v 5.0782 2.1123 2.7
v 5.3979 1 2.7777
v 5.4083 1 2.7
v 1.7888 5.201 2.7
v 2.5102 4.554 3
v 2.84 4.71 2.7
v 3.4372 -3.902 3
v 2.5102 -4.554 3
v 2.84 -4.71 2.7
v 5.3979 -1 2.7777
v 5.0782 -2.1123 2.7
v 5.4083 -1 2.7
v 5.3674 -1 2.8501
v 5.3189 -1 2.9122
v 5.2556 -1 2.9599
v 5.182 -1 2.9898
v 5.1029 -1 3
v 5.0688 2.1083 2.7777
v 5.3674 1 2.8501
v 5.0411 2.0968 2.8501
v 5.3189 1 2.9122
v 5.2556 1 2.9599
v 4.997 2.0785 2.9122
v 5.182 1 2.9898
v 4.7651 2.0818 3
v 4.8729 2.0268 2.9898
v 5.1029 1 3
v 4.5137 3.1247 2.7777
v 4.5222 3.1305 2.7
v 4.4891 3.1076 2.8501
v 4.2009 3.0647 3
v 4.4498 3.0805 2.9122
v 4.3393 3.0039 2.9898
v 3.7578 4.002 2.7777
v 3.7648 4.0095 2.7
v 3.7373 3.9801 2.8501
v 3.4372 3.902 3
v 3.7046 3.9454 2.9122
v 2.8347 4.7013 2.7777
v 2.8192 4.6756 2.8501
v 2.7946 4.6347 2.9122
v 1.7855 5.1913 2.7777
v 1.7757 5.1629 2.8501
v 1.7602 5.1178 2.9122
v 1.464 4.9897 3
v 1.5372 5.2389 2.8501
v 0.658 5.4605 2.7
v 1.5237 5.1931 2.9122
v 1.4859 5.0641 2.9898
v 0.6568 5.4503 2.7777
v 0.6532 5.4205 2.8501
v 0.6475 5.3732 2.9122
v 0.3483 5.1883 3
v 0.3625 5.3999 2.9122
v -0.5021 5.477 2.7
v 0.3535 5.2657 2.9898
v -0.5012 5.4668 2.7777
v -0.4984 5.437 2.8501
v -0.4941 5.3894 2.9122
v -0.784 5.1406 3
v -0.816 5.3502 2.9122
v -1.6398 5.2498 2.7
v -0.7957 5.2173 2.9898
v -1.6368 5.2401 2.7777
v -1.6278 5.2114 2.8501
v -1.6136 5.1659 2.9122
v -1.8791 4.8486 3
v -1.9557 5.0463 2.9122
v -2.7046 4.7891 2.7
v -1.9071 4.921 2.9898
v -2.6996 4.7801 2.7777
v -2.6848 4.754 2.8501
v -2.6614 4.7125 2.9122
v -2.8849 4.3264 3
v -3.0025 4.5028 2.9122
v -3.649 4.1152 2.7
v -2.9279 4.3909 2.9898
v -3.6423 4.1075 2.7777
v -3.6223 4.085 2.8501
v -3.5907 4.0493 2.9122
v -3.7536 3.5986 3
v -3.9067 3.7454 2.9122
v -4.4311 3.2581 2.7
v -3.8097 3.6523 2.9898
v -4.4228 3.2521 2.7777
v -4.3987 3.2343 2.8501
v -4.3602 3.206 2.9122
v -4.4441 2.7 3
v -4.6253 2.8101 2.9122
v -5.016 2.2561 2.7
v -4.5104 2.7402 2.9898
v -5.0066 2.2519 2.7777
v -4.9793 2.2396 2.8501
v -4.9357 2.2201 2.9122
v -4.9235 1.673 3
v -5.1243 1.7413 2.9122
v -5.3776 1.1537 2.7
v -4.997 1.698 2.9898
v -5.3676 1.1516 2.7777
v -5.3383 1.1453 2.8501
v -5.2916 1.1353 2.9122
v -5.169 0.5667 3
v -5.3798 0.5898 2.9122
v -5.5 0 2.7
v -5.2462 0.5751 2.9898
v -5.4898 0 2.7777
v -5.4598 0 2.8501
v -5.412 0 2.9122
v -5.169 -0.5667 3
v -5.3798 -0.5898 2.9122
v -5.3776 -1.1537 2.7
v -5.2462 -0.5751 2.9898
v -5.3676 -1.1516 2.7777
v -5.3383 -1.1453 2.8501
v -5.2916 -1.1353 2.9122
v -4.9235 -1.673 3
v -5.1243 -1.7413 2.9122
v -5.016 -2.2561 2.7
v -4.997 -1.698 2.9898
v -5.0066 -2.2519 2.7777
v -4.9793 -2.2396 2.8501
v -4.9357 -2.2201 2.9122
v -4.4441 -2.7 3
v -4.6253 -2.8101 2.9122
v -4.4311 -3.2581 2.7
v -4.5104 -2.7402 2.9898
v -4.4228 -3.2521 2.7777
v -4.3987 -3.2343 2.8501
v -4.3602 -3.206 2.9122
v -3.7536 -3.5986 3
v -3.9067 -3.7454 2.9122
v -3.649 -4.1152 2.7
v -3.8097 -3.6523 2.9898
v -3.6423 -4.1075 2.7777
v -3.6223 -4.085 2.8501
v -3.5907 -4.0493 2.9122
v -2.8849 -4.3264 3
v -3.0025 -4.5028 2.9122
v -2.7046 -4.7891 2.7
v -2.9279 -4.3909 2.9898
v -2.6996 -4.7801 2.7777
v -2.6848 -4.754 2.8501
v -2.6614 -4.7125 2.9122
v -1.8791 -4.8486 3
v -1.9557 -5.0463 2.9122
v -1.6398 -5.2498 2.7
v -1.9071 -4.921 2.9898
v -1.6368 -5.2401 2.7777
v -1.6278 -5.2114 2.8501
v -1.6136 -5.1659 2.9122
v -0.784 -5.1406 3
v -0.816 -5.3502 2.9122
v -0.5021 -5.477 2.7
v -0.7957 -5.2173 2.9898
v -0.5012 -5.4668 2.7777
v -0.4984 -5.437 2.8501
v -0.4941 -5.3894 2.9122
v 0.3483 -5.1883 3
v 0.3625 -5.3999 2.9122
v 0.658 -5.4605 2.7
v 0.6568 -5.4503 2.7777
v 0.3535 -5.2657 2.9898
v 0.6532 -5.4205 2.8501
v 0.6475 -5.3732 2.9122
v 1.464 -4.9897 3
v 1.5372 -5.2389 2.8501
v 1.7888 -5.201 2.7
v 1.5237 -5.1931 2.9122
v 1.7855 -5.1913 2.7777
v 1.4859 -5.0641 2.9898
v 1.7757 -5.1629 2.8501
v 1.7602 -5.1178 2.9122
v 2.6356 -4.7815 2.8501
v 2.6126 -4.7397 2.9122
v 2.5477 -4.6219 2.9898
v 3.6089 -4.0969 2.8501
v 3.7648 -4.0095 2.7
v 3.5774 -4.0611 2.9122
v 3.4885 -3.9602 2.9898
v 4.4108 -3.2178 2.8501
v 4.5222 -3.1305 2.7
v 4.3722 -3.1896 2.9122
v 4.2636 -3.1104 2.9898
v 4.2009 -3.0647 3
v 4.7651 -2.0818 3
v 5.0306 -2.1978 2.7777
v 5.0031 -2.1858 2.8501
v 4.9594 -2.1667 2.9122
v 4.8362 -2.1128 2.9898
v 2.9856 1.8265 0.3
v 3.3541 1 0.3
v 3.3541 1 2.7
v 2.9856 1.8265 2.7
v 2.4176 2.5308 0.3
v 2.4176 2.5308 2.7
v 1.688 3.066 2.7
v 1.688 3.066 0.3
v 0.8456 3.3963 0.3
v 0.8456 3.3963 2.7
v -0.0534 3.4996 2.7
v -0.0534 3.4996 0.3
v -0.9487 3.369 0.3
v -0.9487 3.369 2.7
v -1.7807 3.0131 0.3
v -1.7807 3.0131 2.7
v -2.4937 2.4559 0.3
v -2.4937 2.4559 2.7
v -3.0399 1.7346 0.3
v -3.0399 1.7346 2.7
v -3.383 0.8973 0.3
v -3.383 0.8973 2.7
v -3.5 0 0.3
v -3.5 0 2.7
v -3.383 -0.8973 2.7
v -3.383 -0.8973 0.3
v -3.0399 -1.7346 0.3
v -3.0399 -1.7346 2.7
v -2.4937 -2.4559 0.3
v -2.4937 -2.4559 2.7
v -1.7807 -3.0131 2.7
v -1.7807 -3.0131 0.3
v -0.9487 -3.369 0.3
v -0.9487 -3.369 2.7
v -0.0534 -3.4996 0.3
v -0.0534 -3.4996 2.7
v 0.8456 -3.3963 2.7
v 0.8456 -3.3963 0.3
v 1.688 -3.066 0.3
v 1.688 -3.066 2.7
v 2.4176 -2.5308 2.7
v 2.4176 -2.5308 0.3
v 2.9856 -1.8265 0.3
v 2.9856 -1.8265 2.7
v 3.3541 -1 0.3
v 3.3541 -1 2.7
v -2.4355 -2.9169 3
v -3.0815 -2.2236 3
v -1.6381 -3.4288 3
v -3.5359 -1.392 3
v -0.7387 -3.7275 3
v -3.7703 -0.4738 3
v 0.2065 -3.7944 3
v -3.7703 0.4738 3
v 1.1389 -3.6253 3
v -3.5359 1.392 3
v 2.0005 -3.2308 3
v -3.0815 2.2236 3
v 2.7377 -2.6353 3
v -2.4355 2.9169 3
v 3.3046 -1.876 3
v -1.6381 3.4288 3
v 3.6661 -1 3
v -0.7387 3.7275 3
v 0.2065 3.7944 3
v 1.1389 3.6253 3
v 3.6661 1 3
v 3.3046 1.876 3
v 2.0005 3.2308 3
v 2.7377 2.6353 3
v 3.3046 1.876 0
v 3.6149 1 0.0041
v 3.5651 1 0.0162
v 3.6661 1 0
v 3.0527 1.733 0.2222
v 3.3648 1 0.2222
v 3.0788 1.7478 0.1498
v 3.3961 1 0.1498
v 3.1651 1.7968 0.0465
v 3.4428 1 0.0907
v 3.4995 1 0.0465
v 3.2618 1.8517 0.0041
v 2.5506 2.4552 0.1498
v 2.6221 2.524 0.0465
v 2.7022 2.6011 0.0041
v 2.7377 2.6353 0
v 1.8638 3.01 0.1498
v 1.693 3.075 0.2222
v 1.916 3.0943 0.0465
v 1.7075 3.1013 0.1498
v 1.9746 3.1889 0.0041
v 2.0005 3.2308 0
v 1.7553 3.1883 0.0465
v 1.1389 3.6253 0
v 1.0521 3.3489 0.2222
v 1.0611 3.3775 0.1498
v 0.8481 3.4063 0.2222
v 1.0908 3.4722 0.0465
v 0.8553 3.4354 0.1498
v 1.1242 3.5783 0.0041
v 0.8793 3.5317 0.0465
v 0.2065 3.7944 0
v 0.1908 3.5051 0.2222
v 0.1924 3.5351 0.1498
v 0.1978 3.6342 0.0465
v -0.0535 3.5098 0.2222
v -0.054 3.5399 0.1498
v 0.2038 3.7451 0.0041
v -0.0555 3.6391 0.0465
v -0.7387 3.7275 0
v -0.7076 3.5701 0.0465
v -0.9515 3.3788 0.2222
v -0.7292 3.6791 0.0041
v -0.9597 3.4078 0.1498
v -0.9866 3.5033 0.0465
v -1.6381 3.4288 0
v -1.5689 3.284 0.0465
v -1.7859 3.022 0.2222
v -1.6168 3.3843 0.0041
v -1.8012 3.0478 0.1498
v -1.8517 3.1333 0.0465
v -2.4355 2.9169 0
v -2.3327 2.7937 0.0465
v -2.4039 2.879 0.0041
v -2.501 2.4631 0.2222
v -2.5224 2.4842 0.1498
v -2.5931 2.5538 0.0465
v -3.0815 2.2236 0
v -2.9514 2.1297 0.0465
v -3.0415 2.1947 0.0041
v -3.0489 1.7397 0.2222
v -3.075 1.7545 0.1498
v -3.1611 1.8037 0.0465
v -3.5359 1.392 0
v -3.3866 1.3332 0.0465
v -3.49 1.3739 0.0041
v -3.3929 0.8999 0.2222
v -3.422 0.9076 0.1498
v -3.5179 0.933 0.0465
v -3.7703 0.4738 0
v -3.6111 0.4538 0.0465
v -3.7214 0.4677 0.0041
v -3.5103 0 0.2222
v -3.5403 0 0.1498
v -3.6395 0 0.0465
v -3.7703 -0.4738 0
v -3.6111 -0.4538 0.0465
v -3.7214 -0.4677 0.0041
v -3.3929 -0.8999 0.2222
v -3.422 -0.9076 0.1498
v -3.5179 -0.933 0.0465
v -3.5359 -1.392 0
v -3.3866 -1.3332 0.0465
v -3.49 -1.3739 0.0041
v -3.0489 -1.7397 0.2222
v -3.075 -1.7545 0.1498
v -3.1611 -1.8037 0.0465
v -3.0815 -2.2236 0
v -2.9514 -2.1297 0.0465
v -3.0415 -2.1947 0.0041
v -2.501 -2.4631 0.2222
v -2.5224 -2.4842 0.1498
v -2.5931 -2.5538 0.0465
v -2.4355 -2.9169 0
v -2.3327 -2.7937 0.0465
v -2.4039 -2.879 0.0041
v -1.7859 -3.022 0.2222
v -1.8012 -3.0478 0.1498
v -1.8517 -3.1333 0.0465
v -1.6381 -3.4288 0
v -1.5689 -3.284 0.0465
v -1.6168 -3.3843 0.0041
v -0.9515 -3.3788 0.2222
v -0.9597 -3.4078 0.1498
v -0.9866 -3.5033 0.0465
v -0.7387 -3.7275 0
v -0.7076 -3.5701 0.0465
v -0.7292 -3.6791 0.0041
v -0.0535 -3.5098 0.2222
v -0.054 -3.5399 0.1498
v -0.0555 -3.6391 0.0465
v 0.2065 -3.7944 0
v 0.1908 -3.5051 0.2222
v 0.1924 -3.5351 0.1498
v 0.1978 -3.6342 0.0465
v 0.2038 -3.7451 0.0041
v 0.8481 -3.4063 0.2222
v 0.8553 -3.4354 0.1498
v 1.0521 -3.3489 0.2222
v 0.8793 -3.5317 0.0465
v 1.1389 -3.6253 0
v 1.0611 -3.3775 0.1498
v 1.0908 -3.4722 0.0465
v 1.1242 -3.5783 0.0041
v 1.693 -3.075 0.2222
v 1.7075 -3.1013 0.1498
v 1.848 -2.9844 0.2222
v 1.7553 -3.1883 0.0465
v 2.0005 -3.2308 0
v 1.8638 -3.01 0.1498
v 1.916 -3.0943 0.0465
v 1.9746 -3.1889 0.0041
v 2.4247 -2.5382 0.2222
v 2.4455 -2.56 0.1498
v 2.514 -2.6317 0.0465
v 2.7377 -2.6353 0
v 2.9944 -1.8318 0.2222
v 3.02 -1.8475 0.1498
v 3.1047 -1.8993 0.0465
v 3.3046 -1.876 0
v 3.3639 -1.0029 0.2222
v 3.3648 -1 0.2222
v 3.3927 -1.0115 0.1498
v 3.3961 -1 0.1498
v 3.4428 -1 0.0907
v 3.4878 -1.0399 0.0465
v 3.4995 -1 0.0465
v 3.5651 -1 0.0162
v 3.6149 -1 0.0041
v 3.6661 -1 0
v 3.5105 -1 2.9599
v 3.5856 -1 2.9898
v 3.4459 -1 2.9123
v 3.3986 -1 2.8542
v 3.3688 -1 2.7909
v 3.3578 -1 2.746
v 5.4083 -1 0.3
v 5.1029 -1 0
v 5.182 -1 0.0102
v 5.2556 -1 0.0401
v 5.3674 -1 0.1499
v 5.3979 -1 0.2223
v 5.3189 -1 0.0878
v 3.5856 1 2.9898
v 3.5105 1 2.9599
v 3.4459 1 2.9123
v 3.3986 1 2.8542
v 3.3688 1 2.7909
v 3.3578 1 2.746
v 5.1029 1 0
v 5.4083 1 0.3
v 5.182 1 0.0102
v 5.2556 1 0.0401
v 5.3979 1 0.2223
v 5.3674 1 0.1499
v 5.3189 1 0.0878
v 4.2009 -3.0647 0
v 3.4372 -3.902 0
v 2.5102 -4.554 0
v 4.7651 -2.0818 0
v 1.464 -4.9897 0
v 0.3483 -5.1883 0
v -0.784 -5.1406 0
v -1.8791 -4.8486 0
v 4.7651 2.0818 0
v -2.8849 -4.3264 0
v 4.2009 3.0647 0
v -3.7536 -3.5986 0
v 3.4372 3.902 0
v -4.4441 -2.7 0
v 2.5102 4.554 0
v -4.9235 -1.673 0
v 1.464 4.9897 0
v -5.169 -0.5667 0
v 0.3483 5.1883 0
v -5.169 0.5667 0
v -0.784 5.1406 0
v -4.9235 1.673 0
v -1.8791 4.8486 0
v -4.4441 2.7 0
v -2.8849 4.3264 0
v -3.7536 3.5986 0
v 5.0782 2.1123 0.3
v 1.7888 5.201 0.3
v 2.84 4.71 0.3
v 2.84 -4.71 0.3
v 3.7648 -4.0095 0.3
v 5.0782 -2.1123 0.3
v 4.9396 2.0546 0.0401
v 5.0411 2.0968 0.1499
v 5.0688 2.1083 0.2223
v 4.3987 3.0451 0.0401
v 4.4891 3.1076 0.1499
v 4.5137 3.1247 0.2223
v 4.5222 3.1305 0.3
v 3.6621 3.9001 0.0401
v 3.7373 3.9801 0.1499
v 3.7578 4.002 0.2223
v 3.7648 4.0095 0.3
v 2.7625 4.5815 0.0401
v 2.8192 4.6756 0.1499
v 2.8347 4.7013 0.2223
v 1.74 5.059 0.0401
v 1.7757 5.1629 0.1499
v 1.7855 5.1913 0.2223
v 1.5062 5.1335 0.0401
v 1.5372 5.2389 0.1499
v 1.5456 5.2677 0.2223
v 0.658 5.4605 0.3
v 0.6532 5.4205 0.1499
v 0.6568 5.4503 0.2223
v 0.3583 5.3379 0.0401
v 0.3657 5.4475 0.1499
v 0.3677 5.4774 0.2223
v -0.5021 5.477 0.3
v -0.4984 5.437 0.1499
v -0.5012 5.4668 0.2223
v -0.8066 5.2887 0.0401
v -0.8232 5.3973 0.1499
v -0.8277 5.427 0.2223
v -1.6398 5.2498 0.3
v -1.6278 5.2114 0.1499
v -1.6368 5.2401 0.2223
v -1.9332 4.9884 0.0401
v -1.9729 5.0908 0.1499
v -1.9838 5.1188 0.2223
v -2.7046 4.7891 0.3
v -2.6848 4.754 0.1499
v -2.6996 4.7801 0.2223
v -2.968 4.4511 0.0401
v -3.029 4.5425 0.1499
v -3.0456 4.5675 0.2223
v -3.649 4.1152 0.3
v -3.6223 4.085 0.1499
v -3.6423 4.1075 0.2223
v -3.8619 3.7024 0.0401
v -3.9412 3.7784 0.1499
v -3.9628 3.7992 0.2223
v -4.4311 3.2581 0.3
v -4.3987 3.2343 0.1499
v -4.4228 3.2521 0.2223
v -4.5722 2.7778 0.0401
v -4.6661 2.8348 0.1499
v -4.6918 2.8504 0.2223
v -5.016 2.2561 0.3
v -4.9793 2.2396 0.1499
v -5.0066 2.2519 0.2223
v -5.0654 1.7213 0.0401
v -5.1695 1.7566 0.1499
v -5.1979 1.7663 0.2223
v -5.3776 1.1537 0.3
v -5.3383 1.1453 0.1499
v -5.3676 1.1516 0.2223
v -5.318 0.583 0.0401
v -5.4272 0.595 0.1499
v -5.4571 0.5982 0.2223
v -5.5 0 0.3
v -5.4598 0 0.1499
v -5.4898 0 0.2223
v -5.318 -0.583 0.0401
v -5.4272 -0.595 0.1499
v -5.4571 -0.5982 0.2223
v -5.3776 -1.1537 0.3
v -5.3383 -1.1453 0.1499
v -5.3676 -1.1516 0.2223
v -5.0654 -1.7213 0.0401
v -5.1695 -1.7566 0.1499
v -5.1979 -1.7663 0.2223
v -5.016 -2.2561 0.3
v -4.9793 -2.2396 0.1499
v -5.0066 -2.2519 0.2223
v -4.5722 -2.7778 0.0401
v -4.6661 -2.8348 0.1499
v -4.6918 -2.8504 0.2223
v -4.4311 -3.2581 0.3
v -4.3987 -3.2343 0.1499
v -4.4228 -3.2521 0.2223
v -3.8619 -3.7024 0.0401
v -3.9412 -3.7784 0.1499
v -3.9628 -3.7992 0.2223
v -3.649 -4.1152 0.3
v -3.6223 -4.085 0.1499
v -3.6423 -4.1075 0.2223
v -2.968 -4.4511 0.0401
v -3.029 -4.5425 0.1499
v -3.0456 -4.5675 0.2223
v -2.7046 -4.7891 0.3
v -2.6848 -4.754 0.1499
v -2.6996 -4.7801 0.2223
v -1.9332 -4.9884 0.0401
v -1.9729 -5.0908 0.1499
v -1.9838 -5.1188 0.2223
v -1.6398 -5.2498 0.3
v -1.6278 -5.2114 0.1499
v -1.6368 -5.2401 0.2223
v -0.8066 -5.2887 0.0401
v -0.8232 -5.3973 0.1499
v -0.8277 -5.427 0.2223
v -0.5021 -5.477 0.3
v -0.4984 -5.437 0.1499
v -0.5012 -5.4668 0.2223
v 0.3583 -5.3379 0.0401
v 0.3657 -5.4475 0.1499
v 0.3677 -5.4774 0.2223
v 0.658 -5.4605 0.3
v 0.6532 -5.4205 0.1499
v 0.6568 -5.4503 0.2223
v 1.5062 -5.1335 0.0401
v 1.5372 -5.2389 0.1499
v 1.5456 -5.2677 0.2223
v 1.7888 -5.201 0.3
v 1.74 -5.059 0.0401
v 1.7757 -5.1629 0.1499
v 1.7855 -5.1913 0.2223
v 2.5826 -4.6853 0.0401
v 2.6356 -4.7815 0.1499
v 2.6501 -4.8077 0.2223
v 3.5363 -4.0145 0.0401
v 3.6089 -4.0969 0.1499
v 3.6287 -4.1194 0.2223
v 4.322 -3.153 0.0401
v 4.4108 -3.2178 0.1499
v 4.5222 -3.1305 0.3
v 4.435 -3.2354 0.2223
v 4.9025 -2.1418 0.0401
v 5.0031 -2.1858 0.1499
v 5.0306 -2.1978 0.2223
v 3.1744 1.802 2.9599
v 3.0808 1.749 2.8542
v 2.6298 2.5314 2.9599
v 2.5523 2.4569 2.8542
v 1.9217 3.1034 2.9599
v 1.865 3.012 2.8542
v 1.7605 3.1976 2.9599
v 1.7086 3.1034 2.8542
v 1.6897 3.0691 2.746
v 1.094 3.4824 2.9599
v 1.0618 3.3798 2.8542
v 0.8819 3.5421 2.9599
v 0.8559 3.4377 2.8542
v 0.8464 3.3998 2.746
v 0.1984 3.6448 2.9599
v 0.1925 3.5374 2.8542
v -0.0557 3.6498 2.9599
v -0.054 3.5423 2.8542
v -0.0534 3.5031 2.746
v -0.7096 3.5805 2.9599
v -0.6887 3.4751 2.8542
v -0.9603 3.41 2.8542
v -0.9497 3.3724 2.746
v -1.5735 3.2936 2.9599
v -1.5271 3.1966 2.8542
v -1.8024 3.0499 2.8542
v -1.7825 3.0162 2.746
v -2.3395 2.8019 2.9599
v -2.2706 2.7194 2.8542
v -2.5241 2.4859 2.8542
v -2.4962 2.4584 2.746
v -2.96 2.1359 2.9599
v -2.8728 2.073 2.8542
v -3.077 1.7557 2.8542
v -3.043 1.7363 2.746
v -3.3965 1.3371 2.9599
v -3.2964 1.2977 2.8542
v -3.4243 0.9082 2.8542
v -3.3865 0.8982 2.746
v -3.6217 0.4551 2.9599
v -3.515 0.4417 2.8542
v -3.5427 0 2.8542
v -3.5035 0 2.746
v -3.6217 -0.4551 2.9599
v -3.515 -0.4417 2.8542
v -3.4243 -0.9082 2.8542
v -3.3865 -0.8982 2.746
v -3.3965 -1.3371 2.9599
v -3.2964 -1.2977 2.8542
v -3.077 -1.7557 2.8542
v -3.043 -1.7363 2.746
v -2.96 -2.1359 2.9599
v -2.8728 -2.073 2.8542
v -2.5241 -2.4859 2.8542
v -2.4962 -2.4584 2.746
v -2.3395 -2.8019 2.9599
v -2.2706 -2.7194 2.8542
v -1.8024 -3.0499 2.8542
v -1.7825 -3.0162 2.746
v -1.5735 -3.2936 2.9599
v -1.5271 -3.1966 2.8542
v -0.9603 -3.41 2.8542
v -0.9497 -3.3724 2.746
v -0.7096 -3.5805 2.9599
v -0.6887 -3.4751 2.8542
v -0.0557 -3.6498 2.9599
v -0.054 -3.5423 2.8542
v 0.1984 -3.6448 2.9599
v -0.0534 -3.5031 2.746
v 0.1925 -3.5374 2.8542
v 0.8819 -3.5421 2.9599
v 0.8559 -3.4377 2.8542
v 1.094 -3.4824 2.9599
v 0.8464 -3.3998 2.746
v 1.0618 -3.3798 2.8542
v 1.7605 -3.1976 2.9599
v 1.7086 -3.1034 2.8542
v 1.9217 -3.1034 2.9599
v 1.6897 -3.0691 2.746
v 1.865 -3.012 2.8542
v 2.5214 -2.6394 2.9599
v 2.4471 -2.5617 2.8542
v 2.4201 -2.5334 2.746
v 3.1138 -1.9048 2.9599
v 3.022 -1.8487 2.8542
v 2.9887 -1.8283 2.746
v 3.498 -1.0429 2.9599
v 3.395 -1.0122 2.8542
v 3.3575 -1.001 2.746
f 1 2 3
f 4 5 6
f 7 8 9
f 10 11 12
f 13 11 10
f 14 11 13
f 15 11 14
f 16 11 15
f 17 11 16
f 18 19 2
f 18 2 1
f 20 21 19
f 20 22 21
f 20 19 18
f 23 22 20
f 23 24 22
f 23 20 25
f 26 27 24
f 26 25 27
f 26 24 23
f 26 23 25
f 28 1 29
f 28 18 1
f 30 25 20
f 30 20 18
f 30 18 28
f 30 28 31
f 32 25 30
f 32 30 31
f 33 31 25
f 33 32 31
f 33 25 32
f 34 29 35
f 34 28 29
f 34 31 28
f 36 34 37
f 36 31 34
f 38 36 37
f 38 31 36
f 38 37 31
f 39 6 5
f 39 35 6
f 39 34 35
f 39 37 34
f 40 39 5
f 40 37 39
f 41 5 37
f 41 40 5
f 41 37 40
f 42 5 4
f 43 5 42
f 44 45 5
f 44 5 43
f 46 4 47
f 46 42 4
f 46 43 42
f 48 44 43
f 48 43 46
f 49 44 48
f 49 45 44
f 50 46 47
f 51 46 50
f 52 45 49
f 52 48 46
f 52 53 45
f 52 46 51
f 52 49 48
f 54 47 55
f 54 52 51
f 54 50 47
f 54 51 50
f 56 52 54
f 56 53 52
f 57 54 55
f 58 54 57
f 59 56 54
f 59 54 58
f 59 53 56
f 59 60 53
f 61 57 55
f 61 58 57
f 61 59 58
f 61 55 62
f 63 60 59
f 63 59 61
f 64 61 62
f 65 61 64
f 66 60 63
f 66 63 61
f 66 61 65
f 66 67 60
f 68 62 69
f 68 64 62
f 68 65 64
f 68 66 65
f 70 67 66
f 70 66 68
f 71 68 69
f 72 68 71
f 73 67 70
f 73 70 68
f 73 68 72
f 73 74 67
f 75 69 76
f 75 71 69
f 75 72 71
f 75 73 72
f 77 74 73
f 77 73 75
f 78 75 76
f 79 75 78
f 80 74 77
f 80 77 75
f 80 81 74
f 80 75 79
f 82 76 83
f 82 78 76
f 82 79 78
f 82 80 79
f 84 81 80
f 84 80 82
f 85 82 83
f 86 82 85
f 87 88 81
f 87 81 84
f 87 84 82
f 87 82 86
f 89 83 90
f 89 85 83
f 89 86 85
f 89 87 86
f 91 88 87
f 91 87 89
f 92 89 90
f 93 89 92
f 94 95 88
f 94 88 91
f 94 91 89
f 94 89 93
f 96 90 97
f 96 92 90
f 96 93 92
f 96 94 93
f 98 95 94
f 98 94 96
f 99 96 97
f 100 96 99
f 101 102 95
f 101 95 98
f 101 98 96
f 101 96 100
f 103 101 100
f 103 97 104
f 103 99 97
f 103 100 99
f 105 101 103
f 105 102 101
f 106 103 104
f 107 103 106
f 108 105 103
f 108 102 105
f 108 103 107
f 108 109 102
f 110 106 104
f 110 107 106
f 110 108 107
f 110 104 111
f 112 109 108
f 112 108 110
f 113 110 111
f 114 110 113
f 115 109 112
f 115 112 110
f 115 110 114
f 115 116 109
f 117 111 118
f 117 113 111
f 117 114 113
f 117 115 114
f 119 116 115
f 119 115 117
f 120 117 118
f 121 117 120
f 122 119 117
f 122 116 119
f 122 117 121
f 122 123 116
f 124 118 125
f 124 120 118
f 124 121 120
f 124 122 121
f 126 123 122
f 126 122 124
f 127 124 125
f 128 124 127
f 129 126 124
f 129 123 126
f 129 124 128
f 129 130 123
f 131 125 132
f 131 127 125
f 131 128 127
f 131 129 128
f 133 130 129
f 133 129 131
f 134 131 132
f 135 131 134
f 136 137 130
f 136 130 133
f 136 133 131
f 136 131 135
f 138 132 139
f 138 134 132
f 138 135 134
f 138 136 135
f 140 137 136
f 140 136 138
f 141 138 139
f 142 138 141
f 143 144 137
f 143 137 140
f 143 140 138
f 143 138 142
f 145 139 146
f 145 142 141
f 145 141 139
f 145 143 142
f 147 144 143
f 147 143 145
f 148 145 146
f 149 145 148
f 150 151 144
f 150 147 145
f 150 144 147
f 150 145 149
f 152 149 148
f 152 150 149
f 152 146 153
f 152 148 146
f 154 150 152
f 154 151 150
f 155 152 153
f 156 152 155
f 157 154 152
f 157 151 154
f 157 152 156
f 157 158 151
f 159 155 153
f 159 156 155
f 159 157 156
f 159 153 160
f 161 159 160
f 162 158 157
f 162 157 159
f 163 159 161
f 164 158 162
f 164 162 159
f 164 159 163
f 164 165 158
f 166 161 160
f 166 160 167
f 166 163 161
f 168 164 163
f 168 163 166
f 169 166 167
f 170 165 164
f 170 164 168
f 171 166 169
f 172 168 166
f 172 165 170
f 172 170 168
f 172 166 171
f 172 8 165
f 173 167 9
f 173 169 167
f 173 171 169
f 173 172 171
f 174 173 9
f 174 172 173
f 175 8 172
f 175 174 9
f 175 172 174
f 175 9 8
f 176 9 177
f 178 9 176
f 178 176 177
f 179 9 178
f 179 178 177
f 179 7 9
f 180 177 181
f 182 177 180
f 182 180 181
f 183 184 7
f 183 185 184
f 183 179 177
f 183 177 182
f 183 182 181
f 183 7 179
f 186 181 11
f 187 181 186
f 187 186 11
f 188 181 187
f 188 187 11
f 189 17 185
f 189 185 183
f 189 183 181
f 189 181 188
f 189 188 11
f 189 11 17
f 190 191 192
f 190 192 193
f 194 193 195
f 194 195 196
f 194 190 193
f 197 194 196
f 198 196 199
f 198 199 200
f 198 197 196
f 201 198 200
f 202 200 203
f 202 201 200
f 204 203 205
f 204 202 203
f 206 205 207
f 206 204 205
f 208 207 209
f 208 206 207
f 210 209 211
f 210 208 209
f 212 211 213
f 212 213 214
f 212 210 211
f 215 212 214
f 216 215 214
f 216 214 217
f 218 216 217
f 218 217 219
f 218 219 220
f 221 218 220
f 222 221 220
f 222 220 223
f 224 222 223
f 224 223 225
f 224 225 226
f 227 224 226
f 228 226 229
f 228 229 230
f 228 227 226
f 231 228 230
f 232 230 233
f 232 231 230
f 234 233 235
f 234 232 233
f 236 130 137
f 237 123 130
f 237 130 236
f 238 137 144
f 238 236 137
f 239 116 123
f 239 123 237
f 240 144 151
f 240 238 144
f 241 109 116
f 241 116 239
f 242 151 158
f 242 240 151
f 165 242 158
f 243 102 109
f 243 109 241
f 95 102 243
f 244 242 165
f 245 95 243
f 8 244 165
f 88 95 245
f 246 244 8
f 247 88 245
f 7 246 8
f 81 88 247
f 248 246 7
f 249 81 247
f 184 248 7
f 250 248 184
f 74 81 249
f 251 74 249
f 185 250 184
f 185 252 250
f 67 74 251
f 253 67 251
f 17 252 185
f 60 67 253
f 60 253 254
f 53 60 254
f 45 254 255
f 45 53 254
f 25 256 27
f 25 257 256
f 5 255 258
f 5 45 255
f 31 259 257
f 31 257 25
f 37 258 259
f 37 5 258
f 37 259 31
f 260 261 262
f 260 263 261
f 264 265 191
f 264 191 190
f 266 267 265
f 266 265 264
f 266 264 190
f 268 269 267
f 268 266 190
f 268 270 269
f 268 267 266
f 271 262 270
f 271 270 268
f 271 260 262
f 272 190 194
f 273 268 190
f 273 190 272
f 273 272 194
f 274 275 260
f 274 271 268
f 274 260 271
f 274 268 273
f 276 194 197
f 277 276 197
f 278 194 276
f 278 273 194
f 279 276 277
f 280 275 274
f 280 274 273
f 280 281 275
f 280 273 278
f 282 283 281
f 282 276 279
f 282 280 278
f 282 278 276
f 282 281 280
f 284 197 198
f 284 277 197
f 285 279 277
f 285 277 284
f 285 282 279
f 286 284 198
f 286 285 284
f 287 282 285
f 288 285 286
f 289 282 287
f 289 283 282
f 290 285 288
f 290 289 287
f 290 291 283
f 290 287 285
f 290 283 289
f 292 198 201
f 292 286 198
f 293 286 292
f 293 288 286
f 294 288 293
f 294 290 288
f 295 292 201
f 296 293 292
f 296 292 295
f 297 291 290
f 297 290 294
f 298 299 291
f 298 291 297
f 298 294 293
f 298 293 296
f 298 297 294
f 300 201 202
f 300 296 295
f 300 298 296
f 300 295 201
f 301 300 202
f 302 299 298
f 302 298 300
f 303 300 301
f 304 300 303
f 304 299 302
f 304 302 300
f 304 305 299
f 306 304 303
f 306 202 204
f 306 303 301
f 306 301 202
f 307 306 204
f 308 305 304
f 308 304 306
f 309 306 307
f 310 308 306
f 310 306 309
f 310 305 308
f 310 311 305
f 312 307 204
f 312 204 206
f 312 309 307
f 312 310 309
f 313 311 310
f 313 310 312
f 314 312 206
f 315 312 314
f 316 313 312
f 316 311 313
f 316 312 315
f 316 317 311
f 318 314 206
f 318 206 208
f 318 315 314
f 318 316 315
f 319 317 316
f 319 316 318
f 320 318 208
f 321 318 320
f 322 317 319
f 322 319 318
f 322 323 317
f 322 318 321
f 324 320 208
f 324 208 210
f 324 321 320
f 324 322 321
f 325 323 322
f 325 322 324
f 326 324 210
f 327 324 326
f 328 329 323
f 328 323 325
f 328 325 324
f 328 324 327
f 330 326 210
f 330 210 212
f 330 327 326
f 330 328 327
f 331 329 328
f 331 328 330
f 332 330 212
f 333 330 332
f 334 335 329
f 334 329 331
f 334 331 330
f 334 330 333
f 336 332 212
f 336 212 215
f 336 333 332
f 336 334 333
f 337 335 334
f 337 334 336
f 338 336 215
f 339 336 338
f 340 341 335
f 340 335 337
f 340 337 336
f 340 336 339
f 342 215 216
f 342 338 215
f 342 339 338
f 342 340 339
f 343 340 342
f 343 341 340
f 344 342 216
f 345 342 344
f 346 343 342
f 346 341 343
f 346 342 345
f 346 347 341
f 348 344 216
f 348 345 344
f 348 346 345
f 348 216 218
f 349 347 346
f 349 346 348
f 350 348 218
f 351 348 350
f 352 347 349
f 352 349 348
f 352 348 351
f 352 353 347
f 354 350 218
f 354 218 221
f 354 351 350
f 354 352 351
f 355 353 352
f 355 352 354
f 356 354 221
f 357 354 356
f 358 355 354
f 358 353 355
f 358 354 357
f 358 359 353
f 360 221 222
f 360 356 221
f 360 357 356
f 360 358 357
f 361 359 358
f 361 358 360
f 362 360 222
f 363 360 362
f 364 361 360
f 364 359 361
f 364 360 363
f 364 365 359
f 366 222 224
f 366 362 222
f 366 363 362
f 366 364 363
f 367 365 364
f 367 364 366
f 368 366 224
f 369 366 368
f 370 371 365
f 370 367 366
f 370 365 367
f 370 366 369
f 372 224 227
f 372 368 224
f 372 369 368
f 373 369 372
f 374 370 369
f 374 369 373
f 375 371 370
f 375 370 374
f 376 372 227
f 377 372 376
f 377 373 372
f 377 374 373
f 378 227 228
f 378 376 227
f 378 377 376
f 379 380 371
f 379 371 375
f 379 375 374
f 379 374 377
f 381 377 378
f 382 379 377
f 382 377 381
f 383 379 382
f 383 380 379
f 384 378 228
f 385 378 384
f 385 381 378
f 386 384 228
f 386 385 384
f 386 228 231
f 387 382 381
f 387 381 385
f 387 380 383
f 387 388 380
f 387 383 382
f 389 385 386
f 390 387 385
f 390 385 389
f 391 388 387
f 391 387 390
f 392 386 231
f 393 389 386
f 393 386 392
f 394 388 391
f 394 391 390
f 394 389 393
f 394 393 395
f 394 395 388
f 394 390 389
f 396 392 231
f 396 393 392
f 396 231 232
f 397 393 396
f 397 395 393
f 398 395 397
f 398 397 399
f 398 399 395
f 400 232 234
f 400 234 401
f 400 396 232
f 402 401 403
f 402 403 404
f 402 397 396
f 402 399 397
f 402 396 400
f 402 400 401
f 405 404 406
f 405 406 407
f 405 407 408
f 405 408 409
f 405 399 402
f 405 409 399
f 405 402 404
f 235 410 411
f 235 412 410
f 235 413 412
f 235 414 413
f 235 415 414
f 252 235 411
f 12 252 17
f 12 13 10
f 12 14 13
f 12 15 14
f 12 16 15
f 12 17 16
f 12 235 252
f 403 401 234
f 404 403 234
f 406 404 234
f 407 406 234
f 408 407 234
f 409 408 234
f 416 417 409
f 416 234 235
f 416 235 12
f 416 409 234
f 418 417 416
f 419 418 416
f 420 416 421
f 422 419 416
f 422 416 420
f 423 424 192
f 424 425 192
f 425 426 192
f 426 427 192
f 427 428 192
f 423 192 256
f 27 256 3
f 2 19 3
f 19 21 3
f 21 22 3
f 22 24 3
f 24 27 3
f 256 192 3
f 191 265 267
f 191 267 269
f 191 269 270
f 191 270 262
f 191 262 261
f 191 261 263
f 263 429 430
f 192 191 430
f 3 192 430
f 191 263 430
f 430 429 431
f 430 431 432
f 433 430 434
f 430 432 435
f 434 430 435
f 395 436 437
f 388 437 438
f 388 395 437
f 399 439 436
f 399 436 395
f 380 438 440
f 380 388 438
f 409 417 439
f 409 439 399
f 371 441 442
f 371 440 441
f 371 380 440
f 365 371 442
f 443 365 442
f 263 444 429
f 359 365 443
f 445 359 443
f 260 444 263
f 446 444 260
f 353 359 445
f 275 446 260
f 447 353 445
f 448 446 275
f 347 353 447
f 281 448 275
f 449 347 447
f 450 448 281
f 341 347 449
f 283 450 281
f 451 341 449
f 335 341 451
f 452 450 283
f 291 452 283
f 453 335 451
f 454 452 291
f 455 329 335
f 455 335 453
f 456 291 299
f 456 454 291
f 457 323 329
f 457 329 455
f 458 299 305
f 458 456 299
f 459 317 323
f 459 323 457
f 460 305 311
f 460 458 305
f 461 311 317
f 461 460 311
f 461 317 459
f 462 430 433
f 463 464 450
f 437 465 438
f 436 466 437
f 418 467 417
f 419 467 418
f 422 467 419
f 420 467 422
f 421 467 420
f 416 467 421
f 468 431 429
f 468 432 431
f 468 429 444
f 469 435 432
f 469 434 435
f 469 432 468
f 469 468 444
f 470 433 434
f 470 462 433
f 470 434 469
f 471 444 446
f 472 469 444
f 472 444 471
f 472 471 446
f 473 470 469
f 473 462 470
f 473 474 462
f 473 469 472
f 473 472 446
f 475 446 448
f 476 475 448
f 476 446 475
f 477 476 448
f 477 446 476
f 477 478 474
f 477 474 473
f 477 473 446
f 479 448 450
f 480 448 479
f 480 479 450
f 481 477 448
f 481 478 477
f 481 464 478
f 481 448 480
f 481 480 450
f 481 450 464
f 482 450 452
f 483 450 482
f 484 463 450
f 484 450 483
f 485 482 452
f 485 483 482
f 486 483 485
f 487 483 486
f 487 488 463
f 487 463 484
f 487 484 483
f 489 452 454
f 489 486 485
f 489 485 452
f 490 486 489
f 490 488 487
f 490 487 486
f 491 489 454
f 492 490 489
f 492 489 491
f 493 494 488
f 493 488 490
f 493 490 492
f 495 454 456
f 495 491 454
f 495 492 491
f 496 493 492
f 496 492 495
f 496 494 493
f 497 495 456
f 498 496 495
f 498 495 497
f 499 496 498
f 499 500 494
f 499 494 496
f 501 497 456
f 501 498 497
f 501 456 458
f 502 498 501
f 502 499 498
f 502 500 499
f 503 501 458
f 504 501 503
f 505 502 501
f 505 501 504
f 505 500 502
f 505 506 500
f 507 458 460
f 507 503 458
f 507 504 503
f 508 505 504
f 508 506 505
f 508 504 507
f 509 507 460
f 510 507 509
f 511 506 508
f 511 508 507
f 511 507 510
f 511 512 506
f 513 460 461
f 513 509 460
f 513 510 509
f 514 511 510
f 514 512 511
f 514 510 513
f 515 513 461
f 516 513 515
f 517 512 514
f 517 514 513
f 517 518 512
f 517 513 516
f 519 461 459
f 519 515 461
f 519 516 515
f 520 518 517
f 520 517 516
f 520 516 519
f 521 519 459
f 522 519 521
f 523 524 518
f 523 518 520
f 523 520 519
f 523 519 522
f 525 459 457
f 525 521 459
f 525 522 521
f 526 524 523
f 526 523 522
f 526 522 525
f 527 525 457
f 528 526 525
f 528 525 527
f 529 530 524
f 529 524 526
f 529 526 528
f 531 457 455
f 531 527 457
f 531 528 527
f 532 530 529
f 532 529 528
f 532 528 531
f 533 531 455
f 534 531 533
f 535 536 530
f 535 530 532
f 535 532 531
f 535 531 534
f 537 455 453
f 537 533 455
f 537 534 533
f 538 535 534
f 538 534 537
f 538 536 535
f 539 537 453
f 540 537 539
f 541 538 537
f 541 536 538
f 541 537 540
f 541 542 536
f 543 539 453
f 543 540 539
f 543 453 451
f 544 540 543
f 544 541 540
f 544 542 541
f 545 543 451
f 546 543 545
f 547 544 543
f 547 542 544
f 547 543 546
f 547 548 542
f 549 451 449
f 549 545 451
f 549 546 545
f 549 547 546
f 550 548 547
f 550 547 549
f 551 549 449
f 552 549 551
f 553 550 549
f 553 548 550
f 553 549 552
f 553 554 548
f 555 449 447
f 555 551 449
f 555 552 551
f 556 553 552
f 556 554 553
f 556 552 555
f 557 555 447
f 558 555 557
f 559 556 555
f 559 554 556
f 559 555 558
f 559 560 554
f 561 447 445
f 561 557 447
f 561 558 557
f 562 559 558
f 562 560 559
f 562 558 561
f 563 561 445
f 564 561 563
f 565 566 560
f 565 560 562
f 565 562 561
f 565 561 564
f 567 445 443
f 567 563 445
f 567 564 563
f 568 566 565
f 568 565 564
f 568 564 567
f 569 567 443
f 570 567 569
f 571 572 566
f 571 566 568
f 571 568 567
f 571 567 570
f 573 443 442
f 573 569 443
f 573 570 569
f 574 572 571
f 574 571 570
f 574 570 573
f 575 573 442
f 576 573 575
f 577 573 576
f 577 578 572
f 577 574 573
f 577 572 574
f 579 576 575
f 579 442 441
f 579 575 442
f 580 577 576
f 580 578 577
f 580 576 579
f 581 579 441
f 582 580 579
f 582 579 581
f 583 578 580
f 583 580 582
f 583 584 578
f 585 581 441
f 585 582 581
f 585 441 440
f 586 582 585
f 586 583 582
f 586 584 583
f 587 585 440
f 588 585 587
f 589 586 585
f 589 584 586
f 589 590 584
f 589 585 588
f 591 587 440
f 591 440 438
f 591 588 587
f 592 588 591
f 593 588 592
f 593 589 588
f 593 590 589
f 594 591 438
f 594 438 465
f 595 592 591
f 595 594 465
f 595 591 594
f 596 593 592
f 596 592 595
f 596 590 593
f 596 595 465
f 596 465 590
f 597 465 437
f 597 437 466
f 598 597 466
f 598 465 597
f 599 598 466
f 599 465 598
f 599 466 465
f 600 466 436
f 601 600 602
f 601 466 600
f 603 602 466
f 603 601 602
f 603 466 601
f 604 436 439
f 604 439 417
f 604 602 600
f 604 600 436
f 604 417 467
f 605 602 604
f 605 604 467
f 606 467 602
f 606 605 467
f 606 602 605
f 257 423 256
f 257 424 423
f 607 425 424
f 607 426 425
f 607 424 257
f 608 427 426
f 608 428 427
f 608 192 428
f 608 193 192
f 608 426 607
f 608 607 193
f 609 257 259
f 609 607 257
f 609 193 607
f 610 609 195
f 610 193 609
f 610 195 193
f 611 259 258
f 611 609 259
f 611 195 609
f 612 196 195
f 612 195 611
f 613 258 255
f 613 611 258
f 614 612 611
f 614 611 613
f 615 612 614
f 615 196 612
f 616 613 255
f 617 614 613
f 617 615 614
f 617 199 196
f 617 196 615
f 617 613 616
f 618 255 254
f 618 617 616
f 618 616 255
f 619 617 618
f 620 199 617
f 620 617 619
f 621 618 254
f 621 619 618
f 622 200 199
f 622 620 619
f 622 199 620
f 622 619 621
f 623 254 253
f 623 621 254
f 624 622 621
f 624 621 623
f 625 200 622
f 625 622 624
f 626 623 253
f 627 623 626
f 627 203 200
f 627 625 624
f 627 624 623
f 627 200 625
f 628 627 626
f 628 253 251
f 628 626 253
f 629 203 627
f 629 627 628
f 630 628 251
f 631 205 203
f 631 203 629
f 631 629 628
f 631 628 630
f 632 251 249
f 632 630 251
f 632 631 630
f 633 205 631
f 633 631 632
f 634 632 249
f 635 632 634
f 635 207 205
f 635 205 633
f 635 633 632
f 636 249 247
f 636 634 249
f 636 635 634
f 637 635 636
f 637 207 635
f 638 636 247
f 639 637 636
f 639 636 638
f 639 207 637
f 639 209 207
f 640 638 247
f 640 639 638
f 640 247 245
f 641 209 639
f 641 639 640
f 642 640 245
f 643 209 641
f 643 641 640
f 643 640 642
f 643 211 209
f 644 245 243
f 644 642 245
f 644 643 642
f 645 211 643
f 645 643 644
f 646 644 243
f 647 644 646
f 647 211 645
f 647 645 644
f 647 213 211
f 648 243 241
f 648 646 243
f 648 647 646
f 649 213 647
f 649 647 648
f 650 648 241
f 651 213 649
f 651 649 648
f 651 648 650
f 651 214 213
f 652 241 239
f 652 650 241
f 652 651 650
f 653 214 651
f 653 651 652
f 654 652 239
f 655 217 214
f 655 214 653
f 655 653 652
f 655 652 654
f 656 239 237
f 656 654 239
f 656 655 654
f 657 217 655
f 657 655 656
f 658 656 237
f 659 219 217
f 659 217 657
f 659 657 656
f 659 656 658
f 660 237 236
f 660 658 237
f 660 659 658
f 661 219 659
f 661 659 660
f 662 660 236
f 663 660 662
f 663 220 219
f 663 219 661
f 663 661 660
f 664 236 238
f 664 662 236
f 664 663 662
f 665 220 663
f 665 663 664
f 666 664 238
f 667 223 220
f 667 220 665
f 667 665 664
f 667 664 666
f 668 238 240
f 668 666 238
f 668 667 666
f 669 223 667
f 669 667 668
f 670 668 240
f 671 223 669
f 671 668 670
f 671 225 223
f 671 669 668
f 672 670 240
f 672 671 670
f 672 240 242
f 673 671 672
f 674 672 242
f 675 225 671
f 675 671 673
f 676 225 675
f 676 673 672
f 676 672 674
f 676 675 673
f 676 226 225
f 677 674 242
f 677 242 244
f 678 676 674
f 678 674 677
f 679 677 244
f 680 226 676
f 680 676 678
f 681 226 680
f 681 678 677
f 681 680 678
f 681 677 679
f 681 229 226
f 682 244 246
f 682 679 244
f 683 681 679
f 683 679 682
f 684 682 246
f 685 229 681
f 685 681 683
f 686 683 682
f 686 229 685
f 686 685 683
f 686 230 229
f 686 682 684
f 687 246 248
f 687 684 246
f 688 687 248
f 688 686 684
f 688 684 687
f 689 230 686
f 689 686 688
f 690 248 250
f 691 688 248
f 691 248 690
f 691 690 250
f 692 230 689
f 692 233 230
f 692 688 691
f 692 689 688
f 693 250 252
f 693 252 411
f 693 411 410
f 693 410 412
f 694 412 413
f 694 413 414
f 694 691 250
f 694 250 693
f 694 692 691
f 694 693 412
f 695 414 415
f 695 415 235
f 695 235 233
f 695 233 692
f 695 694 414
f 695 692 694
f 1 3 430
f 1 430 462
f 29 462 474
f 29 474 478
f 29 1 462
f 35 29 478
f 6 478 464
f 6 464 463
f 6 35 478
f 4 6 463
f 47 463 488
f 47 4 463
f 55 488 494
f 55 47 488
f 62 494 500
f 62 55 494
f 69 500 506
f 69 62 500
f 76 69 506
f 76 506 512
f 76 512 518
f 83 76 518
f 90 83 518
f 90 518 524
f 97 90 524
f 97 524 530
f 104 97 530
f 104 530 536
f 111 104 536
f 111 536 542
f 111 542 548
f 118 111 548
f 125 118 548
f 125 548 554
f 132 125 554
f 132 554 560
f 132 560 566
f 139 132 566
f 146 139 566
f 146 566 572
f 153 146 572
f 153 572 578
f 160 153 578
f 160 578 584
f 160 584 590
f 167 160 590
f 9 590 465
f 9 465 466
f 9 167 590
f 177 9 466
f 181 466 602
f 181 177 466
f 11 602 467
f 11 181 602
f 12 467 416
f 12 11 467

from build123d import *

# Parameters (mm, degrees)
F2_W     = 4.224532
F2_H     = 2
F3_DEPTH = 4


with BuildPart() as f1:
    # F0 (on Front) → F1 (revolve)
    with BuildSketch(Plane.XZ):
        with BuildLine():
            ThreePointArc((3.5, 0.3), (3.587868, 0.087868), (3.8, 0))
            Line((3.8, 0), (5.2, 0))
            ThreePointArc((5.2, 0), (5.412132, 0.087868), (5.5, 0.3))
            Line((5.5, 0.3), (5.5, 2.7))
            ThreePointArc((5.5, 2.7), (5.412132, 2.912132), (5.2, 3))
            Line((5.2, 3), (3.8, 3))
            ThreePointArc((3.8, 3), (3.587868, 2.912132), (3.5, 2.7))
            Line((3.5, 2.7), (3.5, 0.3))
        make_face()
    revolve(axis=Axis((0, 0, 3.851013), (0, 0, 1)))

    # F2 (on Top) → F3 (cut)
    with BuildSketch(Plane.XY):
        with Locations((4.5, 0)):
            Rectangle(F2_W, F2_H)
    extrude(amount=F3_DEPTH, mode=Mode.SUBTRACT)


solid = f1.part
